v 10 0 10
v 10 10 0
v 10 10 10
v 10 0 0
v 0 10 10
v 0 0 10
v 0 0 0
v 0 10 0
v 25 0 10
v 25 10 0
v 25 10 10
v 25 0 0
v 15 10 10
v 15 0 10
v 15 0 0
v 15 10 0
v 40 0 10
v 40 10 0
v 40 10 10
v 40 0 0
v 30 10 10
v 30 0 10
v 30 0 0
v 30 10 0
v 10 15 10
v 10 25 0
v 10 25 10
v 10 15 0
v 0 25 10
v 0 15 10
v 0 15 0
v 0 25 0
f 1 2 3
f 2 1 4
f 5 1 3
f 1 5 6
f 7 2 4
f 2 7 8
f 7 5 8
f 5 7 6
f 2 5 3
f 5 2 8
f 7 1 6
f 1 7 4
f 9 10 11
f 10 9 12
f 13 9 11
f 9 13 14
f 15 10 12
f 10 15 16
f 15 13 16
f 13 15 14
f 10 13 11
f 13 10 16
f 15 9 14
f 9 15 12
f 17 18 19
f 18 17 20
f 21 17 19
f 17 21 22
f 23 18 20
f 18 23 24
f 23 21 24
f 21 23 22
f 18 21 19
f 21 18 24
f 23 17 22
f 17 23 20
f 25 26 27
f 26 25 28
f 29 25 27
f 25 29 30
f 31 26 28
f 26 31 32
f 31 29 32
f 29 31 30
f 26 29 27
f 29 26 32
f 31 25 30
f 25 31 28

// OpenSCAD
// Example of colored geometries in OpenSCAD
module colored_cubes() {
    color("red") 
        translate([0, 0, 0]) 
            cube([10, 10, 10]);
    
    color("green") 
        translate([15, 0, 0]) 
            cube([10, 10, 10]);
    
    color("blue") 
        translate([30, 0, 0]) 
            cube([10, 10, 10]);
    
    color("yellow") 
        translate([0, 15, 0]) 
            cube([10, 10, 10]);
}

colored_cubes(); 
